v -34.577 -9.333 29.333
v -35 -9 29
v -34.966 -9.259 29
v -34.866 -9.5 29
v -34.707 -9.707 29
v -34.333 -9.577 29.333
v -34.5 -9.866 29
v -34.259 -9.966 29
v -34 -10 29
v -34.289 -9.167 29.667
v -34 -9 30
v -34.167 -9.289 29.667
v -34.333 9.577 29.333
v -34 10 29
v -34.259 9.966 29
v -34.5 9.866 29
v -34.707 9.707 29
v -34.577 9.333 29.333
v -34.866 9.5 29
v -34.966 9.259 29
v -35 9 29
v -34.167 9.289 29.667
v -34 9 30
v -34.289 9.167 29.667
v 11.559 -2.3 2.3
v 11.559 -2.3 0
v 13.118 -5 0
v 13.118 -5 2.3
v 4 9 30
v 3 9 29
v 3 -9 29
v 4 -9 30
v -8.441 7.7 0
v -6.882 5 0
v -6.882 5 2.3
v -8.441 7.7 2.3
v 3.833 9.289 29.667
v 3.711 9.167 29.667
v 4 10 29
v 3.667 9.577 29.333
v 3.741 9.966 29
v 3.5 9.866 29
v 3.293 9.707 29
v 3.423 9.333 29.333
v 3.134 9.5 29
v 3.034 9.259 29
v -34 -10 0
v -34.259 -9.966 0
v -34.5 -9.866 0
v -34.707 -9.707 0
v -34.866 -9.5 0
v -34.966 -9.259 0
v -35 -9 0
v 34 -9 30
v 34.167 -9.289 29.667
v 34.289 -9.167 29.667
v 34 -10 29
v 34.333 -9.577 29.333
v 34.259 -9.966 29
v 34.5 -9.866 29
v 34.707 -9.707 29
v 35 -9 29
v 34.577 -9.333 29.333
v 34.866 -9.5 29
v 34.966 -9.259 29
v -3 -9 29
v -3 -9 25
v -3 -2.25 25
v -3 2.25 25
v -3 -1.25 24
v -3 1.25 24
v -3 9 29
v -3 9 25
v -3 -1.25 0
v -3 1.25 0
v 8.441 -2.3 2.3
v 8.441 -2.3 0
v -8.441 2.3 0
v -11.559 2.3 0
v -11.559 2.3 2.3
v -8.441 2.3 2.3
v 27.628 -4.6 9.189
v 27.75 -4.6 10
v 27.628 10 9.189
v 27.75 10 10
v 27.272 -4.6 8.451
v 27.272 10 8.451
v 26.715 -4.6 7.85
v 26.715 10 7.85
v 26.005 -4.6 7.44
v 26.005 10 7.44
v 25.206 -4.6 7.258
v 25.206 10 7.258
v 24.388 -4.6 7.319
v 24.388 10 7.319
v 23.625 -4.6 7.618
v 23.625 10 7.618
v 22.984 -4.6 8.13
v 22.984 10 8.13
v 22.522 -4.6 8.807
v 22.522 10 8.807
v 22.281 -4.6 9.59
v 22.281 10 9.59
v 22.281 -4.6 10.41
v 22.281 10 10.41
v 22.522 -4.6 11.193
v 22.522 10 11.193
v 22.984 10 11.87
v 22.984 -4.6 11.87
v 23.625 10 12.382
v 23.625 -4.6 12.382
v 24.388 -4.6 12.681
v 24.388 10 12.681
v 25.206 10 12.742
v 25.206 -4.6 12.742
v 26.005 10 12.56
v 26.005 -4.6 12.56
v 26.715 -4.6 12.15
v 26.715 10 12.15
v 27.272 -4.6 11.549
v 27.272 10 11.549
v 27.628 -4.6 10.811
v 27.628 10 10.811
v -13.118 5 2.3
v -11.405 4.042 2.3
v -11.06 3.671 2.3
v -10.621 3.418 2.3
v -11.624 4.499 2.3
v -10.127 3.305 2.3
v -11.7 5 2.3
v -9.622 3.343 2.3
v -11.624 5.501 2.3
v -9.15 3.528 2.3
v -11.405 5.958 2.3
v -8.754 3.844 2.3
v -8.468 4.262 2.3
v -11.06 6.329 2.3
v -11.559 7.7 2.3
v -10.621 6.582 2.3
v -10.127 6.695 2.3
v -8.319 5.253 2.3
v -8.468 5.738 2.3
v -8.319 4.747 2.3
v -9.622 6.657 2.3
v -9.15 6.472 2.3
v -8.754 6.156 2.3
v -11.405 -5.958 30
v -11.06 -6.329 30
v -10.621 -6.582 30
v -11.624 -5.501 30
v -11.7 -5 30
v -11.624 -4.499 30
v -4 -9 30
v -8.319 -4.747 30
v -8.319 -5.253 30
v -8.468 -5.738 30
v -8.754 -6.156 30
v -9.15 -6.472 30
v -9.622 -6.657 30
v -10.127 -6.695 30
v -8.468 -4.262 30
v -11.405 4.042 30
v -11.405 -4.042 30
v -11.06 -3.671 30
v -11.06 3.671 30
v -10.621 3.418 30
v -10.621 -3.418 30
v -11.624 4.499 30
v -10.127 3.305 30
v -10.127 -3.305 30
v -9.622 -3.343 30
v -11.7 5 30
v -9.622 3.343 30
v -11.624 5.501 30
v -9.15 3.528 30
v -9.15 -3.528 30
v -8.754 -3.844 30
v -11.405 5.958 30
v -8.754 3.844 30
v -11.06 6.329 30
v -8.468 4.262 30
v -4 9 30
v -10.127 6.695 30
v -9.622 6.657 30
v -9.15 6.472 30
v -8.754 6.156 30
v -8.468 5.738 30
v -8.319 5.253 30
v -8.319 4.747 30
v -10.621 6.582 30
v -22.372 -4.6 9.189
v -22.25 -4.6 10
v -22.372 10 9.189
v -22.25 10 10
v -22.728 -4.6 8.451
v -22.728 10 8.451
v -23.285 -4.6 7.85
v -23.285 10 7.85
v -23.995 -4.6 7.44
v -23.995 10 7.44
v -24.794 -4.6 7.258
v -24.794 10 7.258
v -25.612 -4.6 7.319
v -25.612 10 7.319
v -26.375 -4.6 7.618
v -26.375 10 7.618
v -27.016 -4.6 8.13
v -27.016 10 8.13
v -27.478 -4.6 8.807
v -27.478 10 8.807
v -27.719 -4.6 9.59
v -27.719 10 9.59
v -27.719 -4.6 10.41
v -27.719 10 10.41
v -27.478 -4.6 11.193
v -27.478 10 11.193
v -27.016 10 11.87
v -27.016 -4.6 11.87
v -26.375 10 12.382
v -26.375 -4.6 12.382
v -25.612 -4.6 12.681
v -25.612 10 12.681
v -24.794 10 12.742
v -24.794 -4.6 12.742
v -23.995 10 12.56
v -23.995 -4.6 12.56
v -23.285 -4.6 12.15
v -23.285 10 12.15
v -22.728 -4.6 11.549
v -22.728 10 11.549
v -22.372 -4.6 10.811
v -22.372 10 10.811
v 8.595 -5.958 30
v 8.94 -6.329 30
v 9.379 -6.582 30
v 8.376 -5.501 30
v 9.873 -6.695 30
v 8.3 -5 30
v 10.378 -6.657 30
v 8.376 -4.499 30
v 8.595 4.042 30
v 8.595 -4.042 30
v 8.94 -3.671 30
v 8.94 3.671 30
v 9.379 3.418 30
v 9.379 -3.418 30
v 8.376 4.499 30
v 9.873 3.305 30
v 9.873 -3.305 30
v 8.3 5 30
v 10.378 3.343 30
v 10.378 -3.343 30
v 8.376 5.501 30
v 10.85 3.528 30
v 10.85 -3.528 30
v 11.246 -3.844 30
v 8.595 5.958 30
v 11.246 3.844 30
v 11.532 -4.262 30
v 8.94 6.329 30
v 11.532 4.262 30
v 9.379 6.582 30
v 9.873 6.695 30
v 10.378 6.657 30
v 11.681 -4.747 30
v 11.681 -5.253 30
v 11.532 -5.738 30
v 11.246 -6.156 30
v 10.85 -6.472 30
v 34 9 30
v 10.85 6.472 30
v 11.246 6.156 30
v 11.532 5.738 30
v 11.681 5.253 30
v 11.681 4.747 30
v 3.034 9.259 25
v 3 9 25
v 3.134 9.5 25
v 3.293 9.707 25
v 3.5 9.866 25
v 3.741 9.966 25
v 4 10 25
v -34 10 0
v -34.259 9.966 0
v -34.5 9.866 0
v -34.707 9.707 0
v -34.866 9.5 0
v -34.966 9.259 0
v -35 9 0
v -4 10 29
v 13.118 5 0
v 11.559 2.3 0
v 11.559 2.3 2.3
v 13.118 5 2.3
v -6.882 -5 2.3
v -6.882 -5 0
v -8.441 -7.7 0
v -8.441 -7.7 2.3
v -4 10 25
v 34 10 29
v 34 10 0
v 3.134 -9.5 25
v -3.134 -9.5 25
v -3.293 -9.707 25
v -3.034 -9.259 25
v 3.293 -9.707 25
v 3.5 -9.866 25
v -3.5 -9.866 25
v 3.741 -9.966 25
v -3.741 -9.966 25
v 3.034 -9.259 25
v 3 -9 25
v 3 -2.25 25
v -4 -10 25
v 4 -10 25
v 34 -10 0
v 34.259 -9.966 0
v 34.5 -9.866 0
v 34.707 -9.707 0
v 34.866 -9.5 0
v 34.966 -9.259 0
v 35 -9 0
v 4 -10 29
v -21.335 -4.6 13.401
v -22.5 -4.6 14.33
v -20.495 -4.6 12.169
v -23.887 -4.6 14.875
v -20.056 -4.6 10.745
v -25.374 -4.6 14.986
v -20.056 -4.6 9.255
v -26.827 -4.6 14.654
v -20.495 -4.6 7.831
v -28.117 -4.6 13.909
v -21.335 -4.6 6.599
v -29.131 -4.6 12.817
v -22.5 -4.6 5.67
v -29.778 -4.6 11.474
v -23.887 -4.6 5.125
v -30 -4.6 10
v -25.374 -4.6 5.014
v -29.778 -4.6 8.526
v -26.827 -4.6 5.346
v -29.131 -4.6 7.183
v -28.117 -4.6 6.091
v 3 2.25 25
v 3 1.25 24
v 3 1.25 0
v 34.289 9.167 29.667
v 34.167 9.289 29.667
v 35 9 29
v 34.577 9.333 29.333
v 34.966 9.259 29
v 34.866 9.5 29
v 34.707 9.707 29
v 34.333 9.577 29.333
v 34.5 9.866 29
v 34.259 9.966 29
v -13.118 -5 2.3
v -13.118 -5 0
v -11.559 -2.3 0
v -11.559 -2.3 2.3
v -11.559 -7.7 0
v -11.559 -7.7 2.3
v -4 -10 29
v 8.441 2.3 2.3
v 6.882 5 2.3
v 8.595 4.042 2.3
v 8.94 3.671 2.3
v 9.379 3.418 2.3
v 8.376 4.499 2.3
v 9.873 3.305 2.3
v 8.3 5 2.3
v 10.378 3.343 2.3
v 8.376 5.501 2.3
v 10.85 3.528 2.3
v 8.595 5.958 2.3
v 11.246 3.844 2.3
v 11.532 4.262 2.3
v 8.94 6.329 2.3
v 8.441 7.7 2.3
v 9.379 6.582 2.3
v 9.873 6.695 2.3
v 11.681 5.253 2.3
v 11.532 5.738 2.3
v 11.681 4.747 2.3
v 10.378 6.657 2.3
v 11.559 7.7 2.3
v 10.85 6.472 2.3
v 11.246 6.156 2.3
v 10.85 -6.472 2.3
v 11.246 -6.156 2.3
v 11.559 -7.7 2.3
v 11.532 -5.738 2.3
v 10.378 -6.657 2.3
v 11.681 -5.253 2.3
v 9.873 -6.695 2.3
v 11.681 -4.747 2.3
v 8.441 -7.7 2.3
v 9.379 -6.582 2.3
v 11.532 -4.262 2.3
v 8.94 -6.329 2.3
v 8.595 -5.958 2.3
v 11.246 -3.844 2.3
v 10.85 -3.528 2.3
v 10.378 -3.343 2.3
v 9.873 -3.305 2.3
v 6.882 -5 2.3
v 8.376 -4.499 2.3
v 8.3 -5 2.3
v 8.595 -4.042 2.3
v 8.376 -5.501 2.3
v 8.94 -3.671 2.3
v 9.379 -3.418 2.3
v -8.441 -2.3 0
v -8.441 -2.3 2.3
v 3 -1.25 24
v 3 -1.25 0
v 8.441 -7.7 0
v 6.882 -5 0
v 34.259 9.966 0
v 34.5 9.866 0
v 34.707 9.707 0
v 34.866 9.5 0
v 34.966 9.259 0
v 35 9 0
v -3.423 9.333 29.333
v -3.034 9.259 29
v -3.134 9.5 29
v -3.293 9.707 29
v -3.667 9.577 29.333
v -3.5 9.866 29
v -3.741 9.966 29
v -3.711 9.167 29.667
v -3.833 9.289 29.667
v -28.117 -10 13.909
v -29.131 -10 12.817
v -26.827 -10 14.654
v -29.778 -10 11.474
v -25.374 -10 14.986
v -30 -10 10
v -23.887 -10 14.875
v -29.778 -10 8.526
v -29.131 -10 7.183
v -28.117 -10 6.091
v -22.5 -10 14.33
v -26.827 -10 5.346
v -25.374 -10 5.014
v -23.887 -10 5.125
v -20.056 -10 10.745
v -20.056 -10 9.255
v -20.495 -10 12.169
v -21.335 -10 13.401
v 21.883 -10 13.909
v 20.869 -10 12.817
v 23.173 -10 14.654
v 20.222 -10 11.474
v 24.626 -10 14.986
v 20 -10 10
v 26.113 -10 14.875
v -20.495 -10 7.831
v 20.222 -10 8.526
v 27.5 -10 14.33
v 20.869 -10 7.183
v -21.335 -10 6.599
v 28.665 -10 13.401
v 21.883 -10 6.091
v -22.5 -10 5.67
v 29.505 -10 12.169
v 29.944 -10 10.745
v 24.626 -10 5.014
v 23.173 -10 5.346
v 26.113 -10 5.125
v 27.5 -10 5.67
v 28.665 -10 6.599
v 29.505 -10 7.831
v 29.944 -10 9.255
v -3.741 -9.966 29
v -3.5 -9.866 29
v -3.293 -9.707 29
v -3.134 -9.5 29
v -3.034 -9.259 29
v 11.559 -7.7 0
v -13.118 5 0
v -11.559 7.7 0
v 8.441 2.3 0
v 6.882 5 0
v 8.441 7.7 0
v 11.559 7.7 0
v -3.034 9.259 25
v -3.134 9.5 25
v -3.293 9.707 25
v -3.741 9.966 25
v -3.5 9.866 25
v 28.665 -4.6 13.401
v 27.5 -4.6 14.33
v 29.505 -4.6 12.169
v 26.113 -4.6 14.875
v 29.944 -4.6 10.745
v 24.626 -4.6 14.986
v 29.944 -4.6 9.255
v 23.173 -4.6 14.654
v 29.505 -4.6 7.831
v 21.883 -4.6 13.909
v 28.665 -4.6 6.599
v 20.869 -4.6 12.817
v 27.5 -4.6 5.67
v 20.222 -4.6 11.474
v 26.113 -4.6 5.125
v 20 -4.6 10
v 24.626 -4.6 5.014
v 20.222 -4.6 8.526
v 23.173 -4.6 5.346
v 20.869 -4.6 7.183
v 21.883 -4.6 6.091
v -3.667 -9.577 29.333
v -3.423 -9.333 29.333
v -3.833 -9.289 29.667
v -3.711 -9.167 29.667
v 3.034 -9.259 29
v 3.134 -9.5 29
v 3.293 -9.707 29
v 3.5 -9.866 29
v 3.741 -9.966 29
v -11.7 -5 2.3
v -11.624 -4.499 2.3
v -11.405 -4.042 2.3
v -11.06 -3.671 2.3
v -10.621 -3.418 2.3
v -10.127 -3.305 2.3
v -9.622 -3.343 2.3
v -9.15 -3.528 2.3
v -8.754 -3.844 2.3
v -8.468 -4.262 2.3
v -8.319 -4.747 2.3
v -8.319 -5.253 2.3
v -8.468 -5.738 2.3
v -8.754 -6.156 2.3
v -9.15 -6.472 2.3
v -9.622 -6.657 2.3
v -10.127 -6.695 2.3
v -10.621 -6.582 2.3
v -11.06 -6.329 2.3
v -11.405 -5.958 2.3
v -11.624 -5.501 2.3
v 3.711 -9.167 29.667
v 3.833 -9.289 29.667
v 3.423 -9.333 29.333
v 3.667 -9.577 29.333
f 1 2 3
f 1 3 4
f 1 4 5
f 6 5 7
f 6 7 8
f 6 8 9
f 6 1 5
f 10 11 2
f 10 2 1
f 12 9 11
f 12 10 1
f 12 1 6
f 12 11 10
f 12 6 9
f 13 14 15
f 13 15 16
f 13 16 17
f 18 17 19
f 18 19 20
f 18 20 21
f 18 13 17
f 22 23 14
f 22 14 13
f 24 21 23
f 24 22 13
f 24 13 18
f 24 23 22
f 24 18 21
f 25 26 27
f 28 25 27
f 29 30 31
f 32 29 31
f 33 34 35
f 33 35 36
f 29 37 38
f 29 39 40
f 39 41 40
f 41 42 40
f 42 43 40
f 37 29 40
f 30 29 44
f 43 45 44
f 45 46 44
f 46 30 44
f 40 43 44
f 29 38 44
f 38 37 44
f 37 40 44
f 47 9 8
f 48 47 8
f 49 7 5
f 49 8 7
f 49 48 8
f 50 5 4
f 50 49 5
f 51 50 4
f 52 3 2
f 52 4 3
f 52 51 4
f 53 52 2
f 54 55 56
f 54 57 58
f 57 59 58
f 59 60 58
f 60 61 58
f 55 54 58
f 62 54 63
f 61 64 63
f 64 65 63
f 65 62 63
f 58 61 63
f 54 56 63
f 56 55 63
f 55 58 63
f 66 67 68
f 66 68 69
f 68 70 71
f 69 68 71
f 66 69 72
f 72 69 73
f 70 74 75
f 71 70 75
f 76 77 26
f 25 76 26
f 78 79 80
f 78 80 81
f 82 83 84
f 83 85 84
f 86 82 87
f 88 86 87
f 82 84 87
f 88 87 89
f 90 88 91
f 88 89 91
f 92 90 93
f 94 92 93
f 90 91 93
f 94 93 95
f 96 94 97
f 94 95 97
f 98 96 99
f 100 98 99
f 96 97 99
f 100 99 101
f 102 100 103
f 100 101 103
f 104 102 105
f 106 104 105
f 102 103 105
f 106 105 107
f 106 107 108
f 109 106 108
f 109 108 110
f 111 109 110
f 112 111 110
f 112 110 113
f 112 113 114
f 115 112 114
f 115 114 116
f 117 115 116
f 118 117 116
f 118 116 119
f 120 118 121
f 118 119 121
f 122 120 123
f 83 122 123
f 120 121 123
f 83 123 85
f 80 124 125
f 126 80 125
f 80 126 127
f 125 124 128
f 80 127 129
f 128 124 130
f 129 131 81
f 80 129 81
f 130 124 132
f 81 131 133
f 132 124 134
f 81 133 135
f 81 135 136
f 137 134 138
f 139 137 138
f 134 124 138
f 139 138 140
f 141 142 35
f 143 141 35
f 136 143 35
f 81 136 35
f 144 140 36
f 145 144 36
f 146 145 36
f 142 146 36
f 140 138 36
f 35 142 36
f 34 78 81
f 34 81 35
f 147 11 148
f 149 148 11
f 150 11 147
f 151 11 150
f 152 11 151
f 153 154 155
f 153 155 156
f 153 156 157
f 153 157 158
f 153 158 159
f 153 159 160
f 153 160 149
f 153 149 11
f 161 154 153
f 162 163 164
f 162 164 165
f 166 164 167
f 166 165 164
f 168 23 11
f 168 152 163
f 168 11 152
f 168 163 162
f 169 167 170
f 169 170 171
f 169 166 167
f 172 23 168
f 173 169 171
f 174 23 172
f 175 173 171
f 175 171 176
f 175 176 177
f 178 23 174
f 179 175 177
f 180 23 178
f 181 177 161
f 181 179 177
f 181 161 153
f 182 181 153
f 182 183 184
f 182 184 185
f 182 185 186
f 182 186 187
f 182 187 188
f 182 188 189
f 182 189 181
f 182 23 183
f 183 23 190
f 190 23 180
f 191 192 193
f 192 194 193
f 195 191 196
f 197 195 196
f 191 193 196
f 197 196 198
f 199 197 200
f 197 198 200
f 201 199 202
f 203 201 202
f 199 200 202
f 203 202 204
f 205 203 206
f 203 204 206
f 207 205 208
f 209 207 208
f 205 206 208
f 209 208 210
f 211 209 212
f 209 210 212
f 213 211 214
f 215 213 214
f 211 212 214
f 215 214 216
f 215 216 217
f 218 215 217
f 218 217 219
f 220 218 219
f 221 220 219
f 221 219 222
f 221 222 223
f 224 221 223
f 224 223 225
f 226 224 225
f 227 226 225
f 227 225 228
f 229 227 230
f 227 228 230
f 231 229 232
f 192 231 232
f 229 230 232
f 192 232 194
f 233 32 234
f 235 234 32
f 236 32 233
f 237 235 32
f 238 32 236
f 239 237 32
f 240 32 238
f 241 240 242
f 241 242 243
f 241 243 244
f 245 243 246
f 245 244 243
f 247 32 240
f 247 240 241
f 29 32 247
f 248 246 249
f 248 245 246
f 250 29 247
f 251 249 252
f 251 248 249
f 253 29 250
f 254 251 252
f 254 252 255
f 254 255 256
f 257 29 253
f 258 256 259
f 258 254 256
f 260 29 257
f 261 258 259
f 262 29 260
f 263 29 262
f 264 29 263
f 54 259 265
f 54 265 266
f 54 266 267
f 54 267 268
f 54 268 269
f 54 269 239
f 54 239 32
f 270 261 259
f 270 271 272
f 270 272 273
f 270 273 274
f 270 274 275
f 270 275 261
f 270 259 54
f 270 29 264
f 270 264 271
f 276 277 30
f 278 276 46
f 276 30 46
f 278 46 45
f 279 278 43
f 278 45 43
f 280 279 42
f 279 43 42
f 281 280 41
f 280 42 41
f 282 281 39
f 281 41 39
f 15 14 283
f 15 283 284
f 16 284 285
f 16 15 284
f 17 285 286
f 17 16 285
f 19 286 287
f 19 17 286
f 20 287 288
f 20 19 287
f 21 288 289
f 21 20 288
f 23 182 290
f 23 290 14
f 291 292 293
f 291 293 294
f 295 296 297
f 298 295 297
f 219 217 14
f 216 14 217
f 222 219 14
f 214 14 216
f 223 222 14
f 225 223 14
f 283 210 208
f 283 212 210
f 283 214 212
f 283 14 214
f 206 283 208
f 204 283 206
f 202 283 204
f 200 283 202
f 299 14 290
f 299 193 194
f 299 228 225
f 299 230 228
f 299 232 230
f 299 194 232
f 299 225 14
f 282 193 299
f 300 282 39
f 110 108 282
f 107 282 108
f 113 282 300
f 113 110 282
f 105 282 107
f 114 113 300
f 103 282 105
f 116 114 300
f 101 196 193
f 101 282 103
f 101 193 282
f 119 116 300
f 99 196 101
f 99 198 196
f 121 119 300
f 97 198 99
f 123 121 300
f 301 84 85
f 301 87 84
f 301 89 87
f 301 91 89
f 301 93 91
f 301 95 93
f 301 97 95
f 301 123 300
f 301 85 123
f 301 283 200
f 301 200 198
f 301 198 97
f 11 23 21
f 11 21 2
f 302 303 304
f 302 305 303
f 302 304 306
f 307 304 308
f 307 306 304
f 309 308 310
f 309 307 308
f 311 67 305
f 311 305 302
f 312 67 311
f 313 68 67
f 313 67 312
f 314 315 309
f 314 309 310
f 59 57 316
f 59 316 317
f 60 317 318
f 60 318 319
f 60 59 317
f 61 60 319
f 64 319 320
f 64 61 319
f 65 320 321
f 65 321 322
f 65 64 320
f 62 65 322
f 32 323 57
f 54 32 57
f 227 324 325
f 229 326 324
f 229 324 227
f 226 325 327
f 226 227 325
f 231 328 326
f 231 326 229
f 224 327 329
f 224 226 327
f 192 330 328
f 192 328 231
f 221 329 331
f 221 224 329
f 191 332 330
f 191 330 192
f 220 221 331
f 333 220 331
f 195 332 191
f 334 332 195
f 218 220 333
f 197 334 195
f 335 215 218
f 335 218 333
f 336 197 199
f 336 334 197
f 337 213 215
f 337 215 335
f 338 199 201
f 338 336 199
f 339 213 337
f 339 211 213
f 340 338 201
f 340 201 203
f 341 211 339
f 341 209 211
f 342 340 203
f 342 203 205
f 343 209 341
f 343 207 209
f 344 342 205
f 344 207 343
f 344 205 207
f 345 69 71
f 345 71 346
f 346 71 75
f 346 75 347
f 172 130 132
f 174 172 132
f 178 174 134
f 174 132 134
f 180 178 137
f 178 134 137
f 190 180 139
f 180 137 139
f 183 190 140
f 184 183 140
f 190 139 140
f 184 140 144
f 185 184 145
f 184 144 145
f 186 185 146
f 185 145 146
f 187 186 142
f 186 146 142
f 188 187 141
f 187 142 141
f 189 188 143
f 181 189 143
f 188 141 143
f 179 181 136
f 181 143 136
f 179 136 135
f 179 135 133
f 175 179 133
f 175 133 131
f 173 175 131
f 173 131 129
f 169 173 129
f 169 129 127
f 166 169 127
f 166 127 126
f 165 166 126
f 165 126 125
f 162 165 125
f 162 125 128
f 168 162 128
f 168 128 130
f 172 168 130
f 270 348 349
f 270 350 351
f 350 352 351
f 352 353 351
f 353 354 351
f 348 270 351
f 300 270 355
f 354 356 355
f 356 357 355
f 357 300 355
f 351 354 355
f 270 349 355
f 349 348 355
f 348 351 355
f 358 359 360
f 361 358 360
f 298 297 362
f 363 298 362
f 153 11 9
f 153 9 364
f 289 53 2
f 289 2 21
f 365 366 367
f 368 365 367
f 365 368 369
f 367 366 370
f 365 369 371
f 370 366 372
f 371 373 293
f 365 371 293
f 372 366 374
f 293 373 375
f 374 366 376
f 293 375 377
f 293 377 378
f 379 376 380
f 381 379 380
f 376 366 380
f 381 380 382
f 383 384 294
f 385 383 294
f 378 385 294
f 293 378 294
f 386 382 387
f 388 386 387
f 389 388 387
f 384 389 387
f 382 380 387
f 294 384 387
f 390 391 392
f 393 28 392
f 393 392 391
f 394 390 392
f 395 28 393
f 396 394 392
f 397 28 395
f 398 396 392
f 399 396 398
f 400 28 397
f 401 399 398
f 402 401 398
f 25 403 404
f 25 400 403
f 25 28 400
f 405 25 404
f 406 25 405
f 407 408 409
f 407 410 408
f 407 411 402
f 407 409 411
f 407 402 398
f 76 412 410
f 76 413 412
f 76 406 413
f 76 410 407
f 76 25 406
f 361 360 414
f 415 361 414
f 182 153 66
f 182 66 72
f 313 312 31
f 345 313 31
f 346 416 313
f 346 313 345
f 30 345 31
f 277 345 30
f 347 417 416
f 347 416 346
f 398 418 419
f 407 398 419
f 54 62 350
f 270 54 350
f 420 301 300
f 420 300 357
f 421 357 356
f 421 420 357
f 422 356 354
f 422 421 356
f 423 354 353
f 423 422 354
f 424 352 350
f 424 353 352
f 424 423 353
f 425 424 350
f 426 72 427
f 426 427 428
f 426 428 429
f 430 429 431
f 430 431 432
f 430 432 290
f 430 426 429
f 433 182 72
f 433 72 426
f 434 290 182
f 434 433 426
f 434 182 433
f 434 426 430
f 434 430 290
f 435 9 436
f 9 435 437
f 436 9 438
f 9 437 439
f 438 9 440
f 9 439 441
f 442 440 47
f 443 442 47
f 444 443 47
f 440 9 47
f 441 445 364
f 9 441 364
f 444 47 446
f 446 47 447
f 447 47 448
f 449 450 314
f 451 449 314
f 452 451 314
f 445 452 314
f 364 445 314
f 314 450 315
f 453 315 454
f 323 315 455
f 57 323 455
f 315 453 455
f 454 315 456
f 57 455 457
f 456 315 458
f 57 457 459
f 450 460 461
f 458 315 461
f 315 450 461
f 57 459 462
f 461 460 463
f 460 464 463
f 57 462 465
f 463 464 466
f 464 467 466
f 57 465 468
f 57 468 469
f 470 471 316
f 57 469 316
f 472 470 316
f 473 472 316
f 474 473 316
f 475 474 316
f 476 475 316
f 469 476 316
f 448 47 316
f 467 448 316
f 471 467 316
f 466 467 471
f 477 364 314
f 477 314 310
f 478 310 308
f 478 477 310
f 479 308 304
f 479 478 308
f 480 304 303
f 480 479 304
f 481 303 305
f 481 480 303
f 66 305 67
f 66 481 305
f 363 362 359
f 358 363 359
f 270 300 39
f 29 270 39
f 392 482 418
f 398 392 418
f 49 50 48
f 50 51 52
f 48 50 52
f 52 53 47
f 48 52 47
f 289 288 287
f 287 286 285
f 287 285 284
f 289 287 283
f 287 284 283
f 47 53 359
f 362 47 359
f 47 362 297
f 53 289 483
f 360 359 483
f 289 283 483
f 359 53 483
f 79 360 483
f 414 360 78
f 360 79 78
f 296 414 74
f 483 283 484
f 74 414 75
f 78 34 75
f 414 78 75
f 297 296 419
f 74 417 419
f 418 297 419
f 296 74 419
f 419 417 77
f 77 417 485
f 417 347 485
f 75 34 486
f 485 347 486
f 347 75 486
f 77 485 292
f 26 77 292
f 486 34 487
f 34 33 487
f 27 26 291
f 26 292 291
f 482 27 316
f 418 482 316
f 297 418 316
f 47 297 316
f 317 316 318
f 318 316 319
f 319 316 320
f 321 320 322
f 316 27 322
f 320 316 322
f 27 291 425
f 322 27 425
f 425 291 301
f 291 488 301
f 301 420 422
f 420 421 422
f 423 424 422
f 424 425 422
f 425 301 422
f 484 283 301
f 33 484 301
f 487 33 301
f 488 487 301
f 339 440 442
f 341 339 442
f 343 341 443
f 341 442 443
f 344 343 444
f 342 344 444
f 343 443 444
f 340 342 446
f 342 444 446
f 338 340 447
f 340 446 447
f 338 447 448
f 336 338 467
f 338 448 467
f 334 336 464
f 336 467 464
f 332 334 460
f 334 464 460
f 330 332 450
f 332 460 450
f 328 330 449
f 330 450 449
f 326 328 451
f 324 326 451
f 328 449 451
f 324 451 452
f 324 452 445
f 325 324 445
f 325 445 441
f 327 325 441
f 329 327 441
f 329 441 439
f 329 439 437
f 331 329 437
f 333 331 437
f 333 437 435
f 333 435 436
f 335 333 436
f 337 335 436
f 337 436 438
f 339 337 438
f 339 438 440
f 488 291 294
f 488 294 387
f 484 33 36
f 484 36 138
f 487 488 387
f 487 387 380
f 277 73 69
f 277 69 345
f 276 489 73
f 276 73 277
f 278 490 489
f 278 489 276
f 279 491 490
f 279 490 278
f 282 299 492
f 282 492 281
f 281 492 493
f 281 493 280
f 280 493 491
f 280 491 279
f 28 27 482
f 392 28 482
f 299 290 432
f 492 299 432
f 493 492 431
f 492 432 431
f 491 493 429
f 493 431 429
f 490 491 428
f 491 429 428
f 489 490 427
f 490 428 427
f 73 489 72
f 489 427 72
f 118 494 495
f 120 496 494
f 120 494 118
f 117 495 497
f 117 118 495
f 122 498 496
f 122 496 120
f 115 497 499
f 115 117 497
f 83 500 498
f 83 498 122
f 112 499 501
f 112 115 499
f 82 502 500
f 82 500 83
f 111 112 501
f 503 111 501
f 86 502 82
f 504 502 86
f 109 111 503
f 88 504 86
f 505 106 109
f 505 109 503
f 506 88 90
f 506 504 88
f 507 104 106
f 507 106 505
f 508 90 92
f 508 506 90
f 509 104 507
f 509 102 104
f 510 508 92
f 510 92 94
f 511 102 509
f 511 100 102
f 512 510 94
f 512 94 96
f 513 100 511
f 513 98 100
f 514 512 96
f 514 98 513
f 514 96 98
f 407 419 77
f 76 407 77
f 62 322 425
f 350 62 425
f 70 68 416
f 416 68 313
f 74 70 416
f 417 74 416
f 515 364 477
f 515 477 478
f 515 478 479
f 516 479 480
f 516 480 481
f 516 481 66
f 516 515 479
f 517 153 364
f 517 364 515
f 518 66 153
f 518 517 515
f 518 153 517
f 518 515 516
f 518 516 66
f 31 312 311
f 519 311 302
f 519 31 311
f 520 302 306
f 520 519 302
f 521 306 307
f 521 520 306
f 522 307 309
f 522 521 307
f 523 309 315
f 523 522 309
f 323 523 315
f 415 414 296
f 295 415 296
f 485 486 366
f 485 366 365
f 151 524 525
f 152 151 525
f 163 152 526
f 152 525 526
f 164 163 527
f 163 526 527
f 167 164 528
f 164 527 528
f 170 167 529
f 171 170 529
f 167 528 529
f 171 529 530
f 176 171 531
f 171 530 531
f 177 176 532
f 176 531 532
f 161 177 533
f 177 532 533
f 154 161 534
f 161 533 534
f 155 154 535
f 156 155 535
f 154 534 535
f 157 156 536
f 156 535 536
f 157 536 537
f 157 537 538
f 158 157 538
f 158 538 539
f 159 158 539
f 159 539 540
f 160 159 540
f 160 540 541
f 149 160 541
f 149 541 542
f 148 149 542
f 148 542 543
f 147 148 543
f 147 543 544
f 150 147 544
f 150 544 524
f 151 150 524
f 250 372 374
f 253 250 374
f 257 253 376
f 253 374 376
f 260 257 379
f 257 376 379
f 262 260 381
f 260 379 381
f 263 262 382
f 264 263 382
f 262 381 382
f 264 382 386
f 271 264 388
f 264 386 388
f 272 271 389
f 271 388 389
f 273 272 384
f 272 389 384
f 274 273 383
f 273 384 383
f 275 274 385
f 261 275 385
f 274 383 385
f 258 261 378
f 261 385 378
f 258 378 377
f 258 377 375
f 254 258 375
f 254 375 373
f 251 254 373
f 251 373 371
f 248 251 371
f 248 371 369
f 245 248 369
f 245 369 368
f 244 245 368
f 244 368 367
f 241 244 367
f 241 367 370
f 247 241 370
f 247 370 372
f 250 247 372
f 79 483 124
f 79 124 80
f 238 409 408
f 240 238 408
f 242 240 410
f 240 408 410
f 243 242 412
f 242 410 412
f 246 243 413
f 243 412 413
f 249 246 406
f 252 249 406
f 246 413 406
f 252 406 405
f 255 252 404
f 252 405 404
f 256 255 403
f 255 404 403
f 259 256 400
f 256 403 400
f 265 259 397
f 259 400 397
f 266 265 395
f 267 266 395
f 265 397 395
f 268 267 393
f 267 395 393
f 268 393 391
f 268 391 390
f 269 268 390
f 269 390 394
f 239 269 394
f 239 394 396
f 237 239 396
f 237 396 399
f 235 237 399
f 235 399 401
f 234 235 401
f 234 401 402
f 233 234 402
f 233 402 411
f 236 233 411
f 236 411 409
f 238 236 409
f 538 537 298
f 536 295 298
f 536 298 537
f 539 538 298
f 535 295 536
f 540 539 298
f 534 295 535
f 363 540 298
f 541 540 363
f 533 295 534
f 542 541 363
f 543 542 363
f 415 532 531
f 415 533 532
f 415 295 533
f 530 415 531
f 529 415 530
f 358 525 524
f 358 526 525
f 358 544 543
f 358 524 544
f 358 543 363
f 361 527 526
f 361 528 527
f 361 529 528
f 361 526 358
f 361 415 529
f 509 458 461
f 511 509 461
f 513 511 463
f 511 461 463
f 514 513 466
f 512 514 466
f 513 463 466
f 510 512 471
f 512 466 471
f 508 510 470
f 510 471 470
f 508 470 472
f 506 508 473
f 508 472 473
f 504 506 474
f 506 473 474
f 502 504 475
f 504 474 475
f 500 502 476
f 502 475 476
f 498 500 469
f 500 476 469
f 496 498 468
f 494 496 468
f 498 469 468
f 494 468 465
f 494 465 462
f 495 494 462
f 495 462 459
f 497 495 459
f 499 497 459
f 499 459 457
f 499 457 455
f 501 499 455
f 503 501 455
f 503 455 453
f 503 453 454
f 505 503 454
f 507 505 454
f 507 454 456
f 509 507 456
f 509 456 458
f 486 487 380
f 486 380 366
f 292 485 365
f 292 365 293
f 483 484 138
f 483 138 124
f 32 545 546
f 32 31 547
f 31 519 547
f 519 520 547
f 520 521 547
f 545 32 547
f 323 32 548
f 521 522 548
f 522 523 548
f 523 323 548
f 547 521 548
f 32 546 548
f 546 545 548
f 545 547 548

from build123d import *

# Parameters (mm, degrees)
MAIN_BLOCK_SKETCH_W          = 70
MAIN_BLOCK_SKETCH_H          = 20
MAIN_BLOCK_DEPTH             = 25
THICKER_SECTION_SKETCH_W     = 32
THICKER_SECTION_SKETCH_H     = 20
THICKER_SECTION_DEPTH        = 5
BELT_TRAP_CUT_SKETCH_W       = 6
BELT_TRAP_CUT_SKETCH_H       = 2.5
BELT_TRAP_CUT_DEPTH          = 45.158804332
BELT_HOLDER_MOUNTING_HOLES_D = 3.4
NUT_TRAPS_DEPTH              = 2.3
MOUNTING_HOLES_D             = 5.5
MOUNTING_HOLES_CBORE_D       = 10
MOUNTING_HOLES_CBORE_DEPTH   = 5.4
PRINT_HELPER_FILLETS_R       = 1
BELT_GUIDE_CHAMFERS_SIZE     = 1
COSMETIC_CHAMFERS_SIZE       = 1


with BuildPart() as part:
    # Main Block Sketch → Main Block (new body)
    with BuildSketch(Plane.XY):
        Rectangle(MAIN_BLOCK_SKETCH_W, MAIN_BLOCK_SKETCH_H)
    extrude(amount=MAIN_BLOCK_DEPTH)

    # Thicker Section Sketch → Thicker Section (add)
    with BuildSketch(Plane.XY.offset(25)):
        with Locations((19, 0)):
            Rectangle(THICKER_SECTION_SKETCH_W, THICKER_SECTION_SKETCH_H)
        with Locations((-19, 0)):
            Rectangle(THICKER_SECTION_SKETCH_W, THICKER_SECTION_SKETCH_H)
    extrude(amount=THICKER_SECTION_DEPTH)

    # Belt Trap Cut Sketch → Belt Trap Cut (cut, through all)
    with BuildSketch(Plane.XY.offset(25)):
        Rectangle(BELT_TRAP_CUT_SKETCH_W, BELT_TRAP_CUT_SKETCH_H)
    extrude(amount=-BELT_TRAP_CUT_DEPTH, mode=Mode.SUBTRACT)

    # Belt Holder Mounting Holes (through all)
    with Locations(Plane.XY.offset(30)):
        with Locations((-10, 5), (10, 5), (-10, -5), (10, -5)):
            Hole(BELT_HOLDER_MOUNTING_HOLES_D / 2)

    # Nut Trap Sketch → Nut Traps (cut)
    with BuildSketch(Plane.XY):
        Polygon((11.558845727, 7.7), (8.441154273, 7.7), (6.882308546, 5), (8.441154273, 2.3), (11.558845727, 2.3), (13.117691454, 5), align=None)
        Polygon((-11.558845727, 7.7), (-13.117691454, 5), (-11.558845727, 2.3), (-8.441154273, 2.3), (-6.882308546, 5), (-8.441154273, 7.7), align=None)
        Polygon((-8.441154273, -7.7), (-11.558845727, -7.7), (-13.117691454, -5), (-11.558845727, -2.3), (-8.441154273, -2.3), (-6.882308546, -5), align=None)
        Polygon((13.117691454, -5), (11.558845727, -7.7), (8.441154273, -7.7), (6.882308546, -5), (8.441154273, -2.3), (11.558845727, -2.3), align=None)
    extrude(amount=NUT_TRAPS_DEPTH, mode=Mode.SUBTRACT)

    # Mounting Holes (through all)
    with Locations(Plane(origin=(0, -10, 0), x_dir=(-1, 0, 0), z_dir=(0, -1, 0))):
        with Locations((-25, -10), (25, -10)):
            CounterBoreHole(MOUNTING_HOLES_D / 2, MOUNTING_HOLES_CBORE_D / 2, MOUNTING_HOLES_CBORE_DEPTH)

    # Print Helper Fillets
    print_helper_fillets_edges = [part.edges().sort_by_distance(p)[0] for p in [
        (-3, -10, 27.5),
        (-35, 10, 15),
        (-3, 10, 27.5),
        (-35, -10, 15),
        (3, 10, 27.5),
        (3, -10, 27.5),
        (35, -10, 15),
        (35, 10, 15),
    ]]
    fillet(print_helper_fillets_edges, radius=PRINT_HELPER_FILLETS_R)

    # Belt Guide Chamfers
    belt_guide_chamfers_edges = [part.edges().sort_by_distance(p)[0] for p in [
        (0, 1.25, 25),
        (0, -1.25, 25),
    ]]
    chamfer(belt_guide_chamfers_edges, length=BELT_GUIDE_CHAMFERS_SIZE)

    # Cosmetic Chamfers
    cosmetic_chamfers_edges = [part.edges().sort_by_distance(p)[0] for p in [
        (-3, 0, 30),
        (-19, -10, 30),
        (19, -10, 30),
        (-19, 10, 30),
        (-35, 0, 30),
        (-34.707106781, 9.707106781, 30),
        (-34.707106781, -9.707106781, 30),
        (-3.292893219, 9.707106781, 30),
        (-3.292893219, -9.707106781, 30),
        (3, 0, 30),
        (35, 0, 30),
        (19, 10, 30),
        (34.707106781, 9.707106781, 30),
        (34.707106781, -9.707106781, 30),
        (3.292893219, 9.707106781, 30),
        (3.292893219, -9.707106781, 30),
    ]]
    chamfer(cosmetic_chamfers_edges, length=COSMETIC_CHAMFERS_SIZE)


solid = part.part
